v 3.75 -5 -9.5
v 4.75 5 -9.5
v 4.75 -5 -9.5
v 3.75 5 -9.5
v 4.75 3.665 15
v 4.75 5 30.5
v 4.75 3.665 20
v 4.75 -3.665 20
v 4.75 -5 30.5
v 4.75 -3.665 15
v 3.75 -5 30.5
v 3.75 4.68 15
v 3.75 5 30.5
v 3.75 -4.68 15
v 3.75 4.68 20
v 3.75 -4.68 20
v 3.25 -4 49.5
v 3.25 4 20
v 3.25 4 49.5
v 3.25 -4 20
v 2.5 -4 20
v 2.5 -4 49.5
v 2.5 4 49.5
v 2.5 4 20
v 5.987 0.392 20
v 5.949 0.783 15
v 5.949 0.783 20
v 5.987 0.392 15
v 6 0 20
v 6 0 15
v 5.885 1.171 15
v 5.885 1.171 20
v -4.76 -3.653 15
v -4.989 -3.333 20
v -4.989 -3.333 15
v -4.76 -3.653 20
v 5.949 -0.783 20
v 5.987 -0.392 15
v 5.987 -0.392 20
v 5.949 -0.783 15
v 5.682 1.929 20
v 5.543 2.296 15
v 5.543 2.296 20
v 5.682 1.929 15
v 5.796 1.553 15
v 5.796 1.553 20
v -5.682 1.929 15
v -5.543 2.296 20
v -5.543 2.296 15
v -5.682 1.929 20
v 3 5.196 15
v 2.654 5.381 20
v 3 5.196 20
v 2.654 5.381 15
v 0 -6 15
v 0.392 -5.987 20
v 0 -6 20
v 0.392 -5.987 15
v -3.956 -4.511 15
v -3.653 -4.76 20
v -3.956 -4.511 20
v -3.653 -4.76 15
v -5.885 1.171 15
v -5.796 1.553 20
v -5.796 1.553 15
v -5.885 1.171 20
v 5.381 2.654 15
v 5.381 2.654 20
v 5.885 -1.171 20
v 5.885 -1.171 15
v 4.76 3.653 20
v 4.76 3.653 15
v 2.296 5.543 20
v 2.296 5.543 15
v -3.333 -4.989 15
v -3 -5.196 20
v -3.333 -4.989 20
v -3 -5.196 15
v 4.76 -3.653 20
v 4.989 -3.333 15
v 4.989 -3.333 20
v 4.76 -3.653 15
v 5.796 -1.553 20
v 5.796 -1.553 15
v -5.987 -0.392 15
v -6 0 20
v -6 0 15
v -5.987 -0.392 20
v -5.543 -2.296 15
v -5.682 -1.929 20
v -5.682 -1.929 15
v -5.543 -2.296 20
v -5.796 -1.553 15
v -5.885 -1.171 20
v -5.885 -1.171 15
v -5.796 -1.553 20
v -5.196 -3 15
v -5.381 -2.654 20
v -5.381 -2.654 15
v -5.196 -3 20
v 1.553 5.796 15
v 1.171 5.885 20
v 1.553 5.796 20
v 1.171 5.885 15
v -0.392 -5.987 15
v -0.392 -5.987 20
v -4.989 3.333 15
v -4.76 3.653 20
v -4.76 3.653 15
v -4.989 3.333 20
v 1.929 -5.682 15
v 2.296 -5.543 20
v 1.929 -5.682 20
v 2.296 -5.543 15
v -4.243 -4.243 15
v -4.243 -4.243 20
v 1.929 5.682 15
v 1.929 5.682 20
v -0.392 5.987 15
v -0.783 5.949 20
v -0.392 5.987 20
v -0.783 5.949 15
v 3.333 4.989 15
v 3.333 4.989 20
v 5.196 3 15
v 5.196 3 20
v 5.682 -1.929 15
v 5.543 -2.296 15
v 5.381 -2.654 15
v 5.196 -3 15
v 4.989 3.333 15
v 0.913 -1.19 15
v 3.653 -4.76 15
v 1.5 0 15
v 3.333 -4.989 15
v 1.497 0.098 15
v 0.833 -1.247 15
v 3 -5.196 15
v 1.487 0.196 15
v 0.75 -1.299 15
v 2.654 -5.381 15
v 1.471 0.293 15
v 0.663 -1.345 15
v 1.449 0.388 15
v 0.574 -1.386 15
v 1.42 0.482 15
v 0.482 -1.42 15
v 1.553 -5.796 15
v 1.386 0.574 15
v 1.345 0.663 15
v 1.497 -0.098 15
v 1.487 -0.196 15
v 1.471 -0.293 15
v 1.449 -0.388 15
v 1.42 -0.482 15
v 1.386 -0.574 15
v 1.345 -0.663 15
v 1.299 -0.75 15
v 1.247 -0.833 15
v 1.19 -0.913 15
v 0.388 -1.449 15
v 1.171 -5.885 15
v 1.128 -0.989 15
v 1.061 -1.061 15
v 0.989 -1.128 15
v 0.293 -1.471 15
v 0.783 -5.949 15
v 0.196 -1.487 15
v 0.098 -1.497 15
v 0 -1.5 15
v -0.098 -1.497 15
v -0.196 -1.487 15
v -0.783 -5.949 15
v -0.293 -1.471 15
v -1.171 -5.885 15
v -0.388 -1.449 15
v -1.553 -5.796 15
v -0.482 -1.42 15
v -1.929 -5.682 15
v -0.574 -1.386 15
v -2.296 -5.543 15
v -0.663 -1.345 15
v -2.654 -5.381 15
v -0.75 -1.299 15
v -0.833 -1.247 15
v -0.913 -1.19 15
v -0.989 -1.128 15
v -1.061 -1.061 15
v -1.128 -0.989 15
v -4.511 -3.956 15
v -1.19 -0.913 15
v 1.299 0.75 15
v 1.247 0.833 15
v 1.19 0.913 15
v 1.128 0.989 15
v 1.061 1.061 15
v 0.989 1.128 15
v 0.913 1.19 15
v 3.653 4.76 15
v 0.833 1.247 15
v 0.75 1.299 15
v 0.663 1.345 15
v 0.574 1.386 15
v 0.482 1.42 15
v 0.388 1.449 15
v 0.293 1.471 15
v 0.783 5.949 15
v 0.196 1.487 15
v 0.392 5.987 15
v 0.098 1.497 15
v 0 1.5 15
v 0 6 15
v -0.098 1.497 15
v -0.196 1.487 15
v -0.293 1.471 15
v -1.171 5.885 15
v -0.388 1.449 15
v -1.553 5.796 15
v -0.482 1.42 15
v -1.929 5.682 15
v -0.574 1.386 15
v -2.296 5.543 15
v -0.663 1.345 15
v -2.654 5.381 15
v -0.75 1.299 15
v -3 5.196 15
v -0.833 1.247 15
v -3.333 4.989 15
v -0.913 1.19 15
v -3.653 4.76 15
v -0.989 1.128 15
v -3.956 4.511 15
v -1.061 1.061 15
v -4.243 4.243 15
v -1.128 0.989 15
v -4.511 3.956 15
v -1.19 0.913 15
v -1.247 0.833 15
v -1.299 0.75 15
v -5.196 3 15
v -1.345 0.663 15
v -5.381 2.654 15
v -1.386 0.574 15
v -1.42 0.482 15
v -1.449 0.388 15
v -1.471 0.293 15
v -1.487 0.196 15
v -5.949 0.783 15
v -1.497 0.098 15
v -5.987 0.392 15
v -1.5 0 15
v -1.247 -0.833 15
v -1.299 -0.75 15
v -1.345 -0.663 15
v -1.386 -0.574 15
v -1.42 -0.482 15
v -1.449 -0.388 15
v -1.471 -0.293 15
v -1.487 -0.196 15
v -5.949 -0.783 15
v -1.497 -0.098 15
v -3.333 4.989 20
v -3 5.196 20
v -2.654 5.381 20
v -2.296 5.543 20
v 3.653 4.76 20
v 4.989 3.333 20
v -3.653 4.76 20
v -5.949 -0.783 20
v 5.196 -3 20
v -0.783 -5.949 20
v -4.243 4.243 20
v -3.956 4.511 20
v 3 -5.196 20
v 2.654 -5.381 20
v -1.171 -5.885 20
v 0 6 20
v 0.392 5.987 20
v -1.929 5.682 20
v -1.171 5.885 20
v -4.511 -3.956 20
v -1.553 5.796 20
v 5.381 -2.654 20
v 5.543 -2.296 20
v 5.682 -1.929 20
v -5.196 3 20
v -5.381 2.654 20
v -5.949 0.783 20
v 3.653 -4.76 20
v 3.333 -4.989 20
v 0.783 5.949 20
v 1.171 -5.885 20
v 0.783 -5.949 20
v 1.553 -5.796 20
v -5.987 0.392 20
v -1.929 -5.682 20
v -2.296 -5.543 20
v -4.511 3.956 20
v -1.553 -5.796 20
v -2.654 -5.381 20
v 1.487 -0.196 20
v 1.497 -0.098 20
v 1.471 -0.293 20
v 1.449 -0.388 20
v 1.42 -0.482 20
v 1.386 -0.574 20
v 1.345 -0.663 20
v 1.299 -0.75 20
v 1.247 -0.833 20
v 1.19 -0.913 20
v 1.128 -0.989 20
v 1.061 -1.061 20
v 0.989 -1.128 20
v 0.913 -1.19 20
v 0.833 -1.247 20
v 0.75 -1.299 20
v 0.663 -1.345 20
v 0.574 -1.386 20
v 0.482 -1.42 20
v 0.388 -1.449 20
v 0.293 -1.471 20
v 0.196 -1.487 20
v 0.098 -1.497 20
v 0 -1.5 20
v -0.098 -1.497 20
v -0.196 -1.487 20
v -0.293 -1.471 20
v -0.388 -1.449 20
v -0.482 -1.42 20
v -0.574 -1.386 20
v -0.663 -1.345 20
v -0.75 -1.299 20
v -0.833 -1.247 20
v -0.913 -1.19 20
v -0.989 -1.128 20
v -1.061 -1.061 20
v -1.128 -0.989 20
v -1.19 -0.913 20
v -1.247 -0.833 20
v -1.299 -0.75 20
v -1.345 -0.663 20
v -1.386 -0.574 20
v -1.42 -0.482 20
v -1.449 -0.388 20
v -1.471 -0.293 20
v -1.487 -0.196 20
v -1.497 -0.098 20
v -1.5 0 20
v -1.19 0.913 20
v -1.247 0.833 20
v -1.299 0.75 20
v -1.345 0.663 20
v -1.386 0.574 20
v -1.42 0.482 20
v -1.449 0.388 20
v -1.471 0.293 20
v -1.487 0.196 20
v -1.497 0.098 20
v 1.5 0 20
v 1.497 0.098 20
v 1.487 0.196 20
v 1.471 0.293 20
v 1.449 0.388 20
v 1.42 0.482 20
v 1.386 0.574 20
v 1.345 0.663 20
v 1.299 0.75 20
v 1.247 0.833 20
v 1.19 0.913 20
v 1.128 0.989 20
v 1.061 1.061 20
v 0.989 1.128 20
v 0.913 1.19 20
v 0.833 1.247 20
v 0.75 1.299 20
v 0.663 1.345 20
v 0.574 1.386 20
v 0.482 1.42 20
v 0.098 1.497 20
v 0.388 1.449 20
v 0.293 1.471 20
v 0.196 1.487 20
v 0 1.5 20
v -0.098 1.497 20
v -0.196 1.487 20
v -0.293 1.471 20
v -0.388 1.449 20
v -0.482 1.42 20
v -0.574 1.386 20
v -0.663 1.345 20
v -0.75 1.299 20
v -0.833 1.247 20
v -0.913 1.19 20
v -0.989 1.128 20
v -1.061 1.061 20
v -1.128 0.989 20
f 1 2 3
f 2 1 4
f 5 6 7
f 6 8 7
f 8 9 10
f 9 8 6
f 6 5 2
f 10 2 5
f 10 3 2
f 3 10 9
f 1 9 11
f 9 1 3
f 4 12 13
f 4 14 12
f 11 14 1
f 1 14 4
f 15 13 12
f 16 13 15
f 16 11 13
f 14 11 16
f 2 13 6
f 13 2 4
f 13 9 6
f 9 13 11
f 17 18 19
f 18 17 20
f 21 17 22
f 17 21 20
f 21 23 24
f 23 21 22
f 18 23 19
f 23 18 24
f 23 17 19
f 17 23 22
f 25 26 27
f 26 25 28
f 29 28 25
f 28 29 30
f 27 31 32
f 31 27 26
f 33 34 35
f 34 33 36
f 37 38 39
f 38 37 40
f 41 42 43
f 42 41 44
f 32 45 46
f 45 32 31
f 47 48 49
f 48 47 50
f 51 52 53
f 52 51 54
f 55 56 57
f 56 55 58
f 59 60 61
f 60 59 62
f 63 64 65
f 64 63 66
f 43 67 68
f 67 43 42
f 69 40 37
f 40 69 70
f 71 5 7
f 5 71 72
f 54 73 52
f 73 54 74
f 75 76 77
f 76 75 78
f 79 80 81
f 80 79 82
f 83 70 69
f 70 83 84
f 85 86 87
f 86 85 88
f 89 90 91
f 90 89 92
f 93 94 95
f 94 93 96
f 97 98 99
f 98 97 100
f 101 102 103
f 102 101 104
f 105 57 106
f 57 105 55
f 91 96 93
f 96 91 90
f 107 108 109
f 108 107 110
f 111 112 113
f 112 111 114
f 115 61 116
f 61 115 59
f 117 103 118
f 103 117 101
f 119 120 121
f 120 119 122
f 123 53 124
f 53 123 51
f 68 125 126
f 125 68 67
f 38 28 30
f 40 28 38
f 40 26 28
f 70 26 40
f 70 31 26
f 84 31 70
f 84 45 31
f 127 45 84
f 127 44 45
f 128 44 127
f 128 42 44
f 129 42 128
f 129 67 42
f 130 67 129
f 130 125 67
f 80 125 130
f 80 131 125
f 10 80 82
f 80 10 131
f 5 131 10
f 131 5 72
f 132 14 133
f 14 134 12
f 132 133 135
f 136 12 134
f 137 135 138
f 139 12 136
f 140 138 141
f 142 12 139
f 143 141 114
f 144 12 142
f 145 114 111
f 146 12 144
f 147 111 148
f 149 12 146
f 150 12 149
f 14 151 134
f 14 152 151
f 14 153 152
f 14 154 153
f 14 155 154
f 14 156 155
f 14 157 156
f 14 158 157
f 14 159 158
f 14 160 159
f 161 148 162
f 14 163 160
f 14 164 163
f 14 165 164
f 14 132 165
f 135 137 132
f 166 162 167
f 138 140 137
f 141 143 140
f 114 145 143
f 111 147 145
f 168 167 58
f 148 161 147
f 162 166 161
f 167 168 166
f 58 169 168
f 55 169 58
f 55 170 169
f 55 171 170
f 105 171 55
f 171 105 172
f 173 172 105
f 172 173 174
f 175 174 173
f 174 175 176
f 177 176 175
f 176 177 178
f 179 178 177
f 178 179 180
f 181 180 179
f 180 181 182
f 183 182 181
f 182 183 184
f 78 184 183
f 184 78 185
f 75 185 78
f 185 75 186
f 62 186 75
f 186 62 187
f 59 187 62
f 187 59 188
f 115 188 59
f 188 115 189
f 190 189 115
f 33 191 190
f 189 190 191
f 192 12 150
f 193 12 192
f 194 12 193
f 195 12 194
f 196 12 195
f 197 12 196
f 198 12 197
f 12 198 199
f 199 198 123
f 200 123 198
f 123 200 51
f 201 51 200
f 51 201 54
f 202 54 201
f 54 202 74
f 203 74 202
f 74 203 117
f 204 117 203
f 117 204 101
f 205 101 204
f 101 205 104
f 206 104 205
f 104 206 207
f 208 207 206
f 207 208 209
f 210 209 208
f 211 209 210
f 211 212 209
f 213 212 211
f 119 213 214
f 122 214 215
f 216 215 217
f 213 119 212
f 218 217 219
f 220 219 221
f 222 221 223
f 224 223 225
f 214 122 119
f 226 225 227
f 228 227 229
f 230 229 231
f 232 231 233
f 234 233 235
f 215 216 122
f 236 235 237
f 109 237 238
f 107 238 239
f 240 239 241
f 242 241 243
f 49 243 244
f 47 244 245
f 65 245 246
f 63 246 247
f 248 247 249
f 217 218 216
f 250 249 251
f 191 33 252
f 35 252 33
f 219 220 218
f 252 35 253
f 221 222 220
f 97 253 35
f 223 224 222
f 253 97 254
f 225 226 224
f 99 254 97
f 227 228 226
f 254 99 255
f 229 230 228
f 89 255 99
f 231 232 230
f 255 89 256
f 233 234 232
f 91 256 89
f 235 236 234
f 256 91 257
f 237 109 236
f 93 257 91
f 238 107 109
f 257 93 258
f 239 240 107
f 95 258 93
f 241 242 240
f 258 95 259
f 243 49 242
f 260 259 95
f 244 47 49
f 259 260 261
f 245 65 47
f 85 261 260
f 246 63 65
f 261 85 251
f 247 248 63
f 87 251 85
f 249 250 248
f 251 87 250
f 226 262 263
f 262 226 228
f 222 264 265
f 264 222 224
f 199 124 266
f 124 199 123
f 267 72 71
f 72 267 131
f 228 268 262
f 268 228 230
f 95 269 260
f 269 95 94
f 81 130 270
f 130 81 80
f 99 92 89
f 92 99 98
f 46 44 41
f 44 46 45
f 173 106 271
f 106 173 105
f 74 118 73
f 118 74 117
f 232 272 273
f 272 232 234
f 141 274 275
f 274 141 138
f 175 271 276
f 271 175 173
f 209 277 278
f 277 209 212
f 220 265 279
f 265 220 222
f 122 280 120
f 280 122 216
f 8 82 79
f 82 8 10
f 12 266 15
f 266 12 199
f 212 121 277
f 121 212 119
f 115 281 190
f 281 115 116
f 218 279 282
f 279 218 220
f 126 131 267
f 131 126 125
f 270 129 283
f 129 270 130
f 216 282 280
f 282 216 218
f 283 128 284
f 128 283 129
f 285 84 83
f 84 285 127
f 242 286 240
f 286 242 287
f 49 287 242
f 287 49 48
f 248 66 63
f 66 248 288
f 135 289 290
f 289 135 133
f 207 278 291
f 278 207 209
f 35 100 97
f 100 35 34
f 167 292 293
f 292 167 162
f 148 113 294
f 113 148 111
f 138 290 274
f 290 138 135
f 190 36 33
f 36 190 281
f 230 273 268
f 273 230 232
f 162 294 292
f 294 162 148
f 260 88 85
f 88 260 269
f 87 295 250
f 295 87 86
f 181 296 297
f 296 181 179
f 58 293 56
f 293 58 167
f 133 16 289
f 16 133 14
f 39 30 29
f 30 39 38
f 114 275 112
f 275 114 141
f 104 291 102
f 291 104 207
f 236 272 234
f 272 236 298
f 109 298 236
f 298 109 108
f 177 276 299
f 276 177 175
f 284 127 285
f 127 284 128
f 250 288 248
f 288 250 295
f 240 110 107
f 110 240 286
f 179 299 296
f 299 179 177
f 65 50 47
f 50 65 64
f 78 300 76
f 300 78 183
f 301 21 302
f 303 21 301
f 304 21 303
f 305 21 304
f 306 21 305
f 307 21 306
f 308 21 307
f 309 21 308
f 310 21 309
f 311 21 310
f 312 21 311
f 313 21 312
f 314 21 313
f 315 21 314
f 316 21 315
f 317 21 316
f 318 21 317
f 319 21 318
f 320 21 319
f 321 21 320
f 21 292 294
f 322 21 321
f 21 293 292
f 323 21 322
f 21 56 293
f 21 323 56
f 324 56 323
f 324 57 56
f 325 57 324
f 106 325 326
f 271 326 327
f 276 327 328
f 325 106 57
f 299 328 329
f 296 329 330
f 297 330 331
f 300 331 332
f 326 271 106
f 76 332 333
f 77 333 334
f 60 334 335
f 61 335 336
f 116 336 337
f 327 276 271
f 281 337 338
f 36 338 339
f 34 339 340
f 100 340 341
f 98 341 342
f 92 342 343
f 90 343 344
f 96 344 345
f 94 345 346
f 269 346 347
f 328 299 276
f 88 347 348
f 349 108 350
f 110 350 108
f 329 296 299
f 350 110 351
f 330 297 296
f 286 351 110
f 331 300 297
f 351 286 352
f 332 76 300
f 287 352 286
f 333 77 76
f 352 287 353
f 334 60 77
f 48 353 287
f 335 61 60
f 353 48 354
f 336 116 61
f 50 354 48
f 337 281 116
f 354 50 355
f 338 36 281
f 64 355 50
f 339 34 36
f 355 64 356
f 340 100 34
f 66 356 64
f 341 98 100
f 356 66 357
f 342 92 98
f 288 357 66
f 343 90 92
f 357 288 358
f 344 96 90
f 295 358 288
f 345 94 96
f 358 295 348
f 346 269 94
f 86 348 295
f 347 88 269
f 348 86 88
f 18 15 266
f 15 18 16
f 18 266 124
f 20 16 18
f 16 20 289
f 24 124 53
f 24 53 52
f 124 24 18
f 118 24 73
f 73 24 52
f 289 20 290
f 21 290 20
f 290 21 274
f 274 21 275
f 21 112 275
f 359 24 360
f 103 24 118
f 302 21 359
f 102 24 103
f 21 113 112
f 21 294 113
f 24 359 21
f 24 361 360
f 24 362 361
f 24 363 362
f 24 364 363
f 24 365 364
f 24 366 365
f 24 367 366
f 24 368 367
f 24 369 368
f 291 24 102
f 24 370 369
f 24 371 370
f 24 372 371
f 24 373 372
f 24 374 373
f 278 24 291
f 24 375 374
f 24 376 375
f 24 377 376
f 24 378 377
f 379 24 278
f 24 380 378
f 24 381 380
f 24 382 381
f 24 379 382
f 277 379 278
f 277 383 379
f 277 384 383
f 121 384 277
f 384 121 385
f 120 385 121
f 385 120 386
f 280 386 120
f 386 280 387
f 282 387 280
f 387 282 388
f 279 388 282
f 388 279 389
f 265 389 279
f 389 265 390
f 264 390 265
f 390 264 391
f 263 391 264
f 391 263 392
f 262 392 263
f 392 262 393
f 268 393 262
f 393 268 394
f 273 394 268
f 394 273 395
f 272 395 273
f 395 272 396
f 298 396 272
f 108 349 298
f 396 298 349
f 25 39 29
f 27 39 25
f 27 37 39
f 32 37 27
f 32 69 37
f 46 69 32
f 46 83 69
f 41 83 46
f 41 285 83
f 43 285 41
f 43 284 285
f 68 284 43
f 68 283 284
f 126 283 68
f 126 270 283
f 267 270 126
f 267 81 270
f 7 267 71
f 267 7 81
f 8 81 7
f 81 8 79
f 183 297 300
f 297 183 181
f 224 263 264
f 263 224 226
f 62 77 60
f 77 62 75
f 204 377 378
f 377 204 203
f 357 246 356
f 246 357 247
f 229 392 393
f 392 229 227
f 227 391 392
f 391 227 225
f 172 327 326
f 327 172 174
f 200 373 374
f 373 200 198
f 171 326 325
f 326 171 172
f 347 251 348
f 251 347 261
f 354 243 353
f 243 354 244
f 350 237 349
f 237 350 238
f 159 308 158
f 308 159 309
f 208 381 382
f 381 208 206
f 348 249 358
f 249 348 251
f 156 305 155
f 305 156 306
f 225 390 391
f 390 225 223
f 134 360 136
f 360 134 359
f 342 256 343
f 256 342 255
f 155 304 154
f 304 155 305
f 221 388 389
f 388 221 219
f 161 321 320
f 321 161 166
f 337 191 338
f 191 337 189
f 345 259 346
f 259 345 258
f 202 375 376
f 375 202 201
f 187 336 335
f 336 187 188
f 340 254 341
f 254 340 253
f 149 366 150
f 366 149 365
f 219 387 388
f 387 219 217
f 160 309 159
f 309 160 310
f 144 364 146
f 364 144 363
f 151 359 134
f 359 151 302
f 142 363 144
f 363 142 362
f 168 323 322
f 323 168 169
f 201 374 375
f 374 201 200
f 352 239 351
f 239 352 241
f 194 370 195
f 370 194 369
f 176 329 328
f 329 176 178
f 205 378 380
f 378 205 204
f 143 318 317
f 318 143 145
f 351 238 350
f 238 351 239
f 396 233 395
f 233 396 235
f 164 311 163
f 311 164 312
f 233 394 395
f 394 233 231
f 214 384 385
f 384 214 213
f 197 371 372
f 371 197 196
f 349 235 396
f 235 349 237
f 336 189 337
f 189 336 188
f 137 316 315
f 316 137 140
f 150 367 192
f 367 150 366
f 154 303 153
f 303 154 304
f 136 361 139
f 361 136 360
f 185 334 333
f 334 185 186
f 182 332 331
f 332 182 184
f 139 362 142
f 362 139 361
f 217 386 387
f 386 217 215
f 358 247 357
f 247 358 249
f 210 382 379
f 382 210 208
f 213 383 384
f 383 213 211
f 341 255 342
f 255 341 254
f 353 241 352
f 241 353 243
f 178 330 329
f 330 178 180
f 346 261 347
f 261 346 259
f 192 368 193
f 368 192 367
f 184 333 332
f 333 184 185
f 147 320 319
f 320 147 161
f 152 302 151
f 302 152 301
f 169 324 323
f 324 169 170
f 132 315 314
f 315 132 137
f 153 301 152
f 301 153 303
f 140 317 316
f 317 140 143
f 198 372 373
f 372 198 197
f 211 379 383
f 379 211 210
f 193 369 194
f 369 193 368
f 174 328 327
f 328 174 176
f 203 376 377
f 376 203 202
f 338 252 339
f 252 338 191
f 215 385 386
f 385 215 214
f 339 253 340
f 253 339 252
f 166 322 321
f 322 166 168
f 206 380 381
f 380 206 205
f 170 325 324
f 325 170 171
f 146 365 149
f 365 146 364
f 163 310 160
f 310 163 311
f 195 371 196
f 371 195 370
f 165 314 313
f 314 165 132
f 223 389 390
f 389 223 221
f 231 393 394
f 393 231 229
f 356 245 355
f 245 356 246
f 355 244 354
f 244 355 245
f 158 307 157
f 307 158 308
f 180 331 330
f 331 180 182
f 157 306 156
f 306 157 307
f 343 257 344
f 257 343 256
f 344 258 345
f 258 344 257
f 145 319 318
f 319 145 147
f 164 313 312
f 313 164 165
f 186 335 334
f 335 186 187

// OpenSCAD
// Hose-barb reducer: joins 8 mm ID tubing to 5 mm ID tubing
// Print orientation: standing upright along +Z, centred on origin in X/Y

$fn = 96;

// ---- Dimensions (mm) ----
id_t8      = 8;    // inner diameter of 8 mm tubing
id_t5      = 5;    // inner diameter of 5 mm tubing
bore       = 3;    // central through-bore diameter
barb_h8    = 10;   // height of each 8 mm barb
od8_bottom = 7.5;  // outer diameter of 8 mm barb at bottom
od8_top    = 9.5;  // outer diameter of 8 mm barb at top
collar_d   = 12;   // diameter of cylindrical collar
collar_h   = 5;    // height of collar (z = 20 to 25)
barb_h5    = 8;    // height of each 5 mm barb
od5_bottom = 6.5;  // outer diameter of 5 mm barb at bottom
od5_top    = 5.0;  // outer diameter of 5 mm barb at top
len8       = 20;   // length of 8 mm barb section (z = 0 to 20)
len5       = 16;   // length of 5 mm barb section (z = 25 to 41)
eps        = 0.5;  // overshoot for clean cuts

// ---- Derived ----
od8_step = max(0.01, od8_top - od8_bottom);  // avoid zero in linear extrude
od5_step = max(0.01, od5_bottom - od5_top);

// ---- Model ----
difference() {
    union() {
        // 8 mm tubing barbs (z = 0 to 20)
        for (s = [-1, 1])
            translate([0, 0, s * (len8 / 2 - eps)])
                linear_extrude(height = len8 + 2 * eps)
                    polygon([
                        [od8_bottom / 2, -barb_h8 / 2],
                        [od8_bottom / 2,  barb_h8 / 2],
                        [od8_top / 2,   barb_h8 / 2],
                        [od8_top / 2,   -barb_h8 / 2]
                    ]);

        // Collar (z = 20 to 25)
        translate([0, 0, len8 - collar_h])
            cylinder(d = collar_d, h = collar_h);

        // 5 mm tubing barbs (z = 25 to 41)
        for (s = [-1, 1])
            translate([0, 0, s * (len5 / 2 - eps) + len8 + collar_h])
                linear_extrude(height = len5 + 2 * eps)
                    polygon([
                        [od5_bottom / 2, -barb_h5 / 2],
                        [od5_bottom / 2,  barb_h5 / 2],
                        [od5_top / 2,    barb_h5 / 2],
                        [od5_top / 2,    -barb_h5 / 2]
                    ]);
    }

    // Central through-bore
    translate([0, 0, -eps])
        cylinder(d = bore, h = len8 + collar_h + len5 + 2 * eps);
}
